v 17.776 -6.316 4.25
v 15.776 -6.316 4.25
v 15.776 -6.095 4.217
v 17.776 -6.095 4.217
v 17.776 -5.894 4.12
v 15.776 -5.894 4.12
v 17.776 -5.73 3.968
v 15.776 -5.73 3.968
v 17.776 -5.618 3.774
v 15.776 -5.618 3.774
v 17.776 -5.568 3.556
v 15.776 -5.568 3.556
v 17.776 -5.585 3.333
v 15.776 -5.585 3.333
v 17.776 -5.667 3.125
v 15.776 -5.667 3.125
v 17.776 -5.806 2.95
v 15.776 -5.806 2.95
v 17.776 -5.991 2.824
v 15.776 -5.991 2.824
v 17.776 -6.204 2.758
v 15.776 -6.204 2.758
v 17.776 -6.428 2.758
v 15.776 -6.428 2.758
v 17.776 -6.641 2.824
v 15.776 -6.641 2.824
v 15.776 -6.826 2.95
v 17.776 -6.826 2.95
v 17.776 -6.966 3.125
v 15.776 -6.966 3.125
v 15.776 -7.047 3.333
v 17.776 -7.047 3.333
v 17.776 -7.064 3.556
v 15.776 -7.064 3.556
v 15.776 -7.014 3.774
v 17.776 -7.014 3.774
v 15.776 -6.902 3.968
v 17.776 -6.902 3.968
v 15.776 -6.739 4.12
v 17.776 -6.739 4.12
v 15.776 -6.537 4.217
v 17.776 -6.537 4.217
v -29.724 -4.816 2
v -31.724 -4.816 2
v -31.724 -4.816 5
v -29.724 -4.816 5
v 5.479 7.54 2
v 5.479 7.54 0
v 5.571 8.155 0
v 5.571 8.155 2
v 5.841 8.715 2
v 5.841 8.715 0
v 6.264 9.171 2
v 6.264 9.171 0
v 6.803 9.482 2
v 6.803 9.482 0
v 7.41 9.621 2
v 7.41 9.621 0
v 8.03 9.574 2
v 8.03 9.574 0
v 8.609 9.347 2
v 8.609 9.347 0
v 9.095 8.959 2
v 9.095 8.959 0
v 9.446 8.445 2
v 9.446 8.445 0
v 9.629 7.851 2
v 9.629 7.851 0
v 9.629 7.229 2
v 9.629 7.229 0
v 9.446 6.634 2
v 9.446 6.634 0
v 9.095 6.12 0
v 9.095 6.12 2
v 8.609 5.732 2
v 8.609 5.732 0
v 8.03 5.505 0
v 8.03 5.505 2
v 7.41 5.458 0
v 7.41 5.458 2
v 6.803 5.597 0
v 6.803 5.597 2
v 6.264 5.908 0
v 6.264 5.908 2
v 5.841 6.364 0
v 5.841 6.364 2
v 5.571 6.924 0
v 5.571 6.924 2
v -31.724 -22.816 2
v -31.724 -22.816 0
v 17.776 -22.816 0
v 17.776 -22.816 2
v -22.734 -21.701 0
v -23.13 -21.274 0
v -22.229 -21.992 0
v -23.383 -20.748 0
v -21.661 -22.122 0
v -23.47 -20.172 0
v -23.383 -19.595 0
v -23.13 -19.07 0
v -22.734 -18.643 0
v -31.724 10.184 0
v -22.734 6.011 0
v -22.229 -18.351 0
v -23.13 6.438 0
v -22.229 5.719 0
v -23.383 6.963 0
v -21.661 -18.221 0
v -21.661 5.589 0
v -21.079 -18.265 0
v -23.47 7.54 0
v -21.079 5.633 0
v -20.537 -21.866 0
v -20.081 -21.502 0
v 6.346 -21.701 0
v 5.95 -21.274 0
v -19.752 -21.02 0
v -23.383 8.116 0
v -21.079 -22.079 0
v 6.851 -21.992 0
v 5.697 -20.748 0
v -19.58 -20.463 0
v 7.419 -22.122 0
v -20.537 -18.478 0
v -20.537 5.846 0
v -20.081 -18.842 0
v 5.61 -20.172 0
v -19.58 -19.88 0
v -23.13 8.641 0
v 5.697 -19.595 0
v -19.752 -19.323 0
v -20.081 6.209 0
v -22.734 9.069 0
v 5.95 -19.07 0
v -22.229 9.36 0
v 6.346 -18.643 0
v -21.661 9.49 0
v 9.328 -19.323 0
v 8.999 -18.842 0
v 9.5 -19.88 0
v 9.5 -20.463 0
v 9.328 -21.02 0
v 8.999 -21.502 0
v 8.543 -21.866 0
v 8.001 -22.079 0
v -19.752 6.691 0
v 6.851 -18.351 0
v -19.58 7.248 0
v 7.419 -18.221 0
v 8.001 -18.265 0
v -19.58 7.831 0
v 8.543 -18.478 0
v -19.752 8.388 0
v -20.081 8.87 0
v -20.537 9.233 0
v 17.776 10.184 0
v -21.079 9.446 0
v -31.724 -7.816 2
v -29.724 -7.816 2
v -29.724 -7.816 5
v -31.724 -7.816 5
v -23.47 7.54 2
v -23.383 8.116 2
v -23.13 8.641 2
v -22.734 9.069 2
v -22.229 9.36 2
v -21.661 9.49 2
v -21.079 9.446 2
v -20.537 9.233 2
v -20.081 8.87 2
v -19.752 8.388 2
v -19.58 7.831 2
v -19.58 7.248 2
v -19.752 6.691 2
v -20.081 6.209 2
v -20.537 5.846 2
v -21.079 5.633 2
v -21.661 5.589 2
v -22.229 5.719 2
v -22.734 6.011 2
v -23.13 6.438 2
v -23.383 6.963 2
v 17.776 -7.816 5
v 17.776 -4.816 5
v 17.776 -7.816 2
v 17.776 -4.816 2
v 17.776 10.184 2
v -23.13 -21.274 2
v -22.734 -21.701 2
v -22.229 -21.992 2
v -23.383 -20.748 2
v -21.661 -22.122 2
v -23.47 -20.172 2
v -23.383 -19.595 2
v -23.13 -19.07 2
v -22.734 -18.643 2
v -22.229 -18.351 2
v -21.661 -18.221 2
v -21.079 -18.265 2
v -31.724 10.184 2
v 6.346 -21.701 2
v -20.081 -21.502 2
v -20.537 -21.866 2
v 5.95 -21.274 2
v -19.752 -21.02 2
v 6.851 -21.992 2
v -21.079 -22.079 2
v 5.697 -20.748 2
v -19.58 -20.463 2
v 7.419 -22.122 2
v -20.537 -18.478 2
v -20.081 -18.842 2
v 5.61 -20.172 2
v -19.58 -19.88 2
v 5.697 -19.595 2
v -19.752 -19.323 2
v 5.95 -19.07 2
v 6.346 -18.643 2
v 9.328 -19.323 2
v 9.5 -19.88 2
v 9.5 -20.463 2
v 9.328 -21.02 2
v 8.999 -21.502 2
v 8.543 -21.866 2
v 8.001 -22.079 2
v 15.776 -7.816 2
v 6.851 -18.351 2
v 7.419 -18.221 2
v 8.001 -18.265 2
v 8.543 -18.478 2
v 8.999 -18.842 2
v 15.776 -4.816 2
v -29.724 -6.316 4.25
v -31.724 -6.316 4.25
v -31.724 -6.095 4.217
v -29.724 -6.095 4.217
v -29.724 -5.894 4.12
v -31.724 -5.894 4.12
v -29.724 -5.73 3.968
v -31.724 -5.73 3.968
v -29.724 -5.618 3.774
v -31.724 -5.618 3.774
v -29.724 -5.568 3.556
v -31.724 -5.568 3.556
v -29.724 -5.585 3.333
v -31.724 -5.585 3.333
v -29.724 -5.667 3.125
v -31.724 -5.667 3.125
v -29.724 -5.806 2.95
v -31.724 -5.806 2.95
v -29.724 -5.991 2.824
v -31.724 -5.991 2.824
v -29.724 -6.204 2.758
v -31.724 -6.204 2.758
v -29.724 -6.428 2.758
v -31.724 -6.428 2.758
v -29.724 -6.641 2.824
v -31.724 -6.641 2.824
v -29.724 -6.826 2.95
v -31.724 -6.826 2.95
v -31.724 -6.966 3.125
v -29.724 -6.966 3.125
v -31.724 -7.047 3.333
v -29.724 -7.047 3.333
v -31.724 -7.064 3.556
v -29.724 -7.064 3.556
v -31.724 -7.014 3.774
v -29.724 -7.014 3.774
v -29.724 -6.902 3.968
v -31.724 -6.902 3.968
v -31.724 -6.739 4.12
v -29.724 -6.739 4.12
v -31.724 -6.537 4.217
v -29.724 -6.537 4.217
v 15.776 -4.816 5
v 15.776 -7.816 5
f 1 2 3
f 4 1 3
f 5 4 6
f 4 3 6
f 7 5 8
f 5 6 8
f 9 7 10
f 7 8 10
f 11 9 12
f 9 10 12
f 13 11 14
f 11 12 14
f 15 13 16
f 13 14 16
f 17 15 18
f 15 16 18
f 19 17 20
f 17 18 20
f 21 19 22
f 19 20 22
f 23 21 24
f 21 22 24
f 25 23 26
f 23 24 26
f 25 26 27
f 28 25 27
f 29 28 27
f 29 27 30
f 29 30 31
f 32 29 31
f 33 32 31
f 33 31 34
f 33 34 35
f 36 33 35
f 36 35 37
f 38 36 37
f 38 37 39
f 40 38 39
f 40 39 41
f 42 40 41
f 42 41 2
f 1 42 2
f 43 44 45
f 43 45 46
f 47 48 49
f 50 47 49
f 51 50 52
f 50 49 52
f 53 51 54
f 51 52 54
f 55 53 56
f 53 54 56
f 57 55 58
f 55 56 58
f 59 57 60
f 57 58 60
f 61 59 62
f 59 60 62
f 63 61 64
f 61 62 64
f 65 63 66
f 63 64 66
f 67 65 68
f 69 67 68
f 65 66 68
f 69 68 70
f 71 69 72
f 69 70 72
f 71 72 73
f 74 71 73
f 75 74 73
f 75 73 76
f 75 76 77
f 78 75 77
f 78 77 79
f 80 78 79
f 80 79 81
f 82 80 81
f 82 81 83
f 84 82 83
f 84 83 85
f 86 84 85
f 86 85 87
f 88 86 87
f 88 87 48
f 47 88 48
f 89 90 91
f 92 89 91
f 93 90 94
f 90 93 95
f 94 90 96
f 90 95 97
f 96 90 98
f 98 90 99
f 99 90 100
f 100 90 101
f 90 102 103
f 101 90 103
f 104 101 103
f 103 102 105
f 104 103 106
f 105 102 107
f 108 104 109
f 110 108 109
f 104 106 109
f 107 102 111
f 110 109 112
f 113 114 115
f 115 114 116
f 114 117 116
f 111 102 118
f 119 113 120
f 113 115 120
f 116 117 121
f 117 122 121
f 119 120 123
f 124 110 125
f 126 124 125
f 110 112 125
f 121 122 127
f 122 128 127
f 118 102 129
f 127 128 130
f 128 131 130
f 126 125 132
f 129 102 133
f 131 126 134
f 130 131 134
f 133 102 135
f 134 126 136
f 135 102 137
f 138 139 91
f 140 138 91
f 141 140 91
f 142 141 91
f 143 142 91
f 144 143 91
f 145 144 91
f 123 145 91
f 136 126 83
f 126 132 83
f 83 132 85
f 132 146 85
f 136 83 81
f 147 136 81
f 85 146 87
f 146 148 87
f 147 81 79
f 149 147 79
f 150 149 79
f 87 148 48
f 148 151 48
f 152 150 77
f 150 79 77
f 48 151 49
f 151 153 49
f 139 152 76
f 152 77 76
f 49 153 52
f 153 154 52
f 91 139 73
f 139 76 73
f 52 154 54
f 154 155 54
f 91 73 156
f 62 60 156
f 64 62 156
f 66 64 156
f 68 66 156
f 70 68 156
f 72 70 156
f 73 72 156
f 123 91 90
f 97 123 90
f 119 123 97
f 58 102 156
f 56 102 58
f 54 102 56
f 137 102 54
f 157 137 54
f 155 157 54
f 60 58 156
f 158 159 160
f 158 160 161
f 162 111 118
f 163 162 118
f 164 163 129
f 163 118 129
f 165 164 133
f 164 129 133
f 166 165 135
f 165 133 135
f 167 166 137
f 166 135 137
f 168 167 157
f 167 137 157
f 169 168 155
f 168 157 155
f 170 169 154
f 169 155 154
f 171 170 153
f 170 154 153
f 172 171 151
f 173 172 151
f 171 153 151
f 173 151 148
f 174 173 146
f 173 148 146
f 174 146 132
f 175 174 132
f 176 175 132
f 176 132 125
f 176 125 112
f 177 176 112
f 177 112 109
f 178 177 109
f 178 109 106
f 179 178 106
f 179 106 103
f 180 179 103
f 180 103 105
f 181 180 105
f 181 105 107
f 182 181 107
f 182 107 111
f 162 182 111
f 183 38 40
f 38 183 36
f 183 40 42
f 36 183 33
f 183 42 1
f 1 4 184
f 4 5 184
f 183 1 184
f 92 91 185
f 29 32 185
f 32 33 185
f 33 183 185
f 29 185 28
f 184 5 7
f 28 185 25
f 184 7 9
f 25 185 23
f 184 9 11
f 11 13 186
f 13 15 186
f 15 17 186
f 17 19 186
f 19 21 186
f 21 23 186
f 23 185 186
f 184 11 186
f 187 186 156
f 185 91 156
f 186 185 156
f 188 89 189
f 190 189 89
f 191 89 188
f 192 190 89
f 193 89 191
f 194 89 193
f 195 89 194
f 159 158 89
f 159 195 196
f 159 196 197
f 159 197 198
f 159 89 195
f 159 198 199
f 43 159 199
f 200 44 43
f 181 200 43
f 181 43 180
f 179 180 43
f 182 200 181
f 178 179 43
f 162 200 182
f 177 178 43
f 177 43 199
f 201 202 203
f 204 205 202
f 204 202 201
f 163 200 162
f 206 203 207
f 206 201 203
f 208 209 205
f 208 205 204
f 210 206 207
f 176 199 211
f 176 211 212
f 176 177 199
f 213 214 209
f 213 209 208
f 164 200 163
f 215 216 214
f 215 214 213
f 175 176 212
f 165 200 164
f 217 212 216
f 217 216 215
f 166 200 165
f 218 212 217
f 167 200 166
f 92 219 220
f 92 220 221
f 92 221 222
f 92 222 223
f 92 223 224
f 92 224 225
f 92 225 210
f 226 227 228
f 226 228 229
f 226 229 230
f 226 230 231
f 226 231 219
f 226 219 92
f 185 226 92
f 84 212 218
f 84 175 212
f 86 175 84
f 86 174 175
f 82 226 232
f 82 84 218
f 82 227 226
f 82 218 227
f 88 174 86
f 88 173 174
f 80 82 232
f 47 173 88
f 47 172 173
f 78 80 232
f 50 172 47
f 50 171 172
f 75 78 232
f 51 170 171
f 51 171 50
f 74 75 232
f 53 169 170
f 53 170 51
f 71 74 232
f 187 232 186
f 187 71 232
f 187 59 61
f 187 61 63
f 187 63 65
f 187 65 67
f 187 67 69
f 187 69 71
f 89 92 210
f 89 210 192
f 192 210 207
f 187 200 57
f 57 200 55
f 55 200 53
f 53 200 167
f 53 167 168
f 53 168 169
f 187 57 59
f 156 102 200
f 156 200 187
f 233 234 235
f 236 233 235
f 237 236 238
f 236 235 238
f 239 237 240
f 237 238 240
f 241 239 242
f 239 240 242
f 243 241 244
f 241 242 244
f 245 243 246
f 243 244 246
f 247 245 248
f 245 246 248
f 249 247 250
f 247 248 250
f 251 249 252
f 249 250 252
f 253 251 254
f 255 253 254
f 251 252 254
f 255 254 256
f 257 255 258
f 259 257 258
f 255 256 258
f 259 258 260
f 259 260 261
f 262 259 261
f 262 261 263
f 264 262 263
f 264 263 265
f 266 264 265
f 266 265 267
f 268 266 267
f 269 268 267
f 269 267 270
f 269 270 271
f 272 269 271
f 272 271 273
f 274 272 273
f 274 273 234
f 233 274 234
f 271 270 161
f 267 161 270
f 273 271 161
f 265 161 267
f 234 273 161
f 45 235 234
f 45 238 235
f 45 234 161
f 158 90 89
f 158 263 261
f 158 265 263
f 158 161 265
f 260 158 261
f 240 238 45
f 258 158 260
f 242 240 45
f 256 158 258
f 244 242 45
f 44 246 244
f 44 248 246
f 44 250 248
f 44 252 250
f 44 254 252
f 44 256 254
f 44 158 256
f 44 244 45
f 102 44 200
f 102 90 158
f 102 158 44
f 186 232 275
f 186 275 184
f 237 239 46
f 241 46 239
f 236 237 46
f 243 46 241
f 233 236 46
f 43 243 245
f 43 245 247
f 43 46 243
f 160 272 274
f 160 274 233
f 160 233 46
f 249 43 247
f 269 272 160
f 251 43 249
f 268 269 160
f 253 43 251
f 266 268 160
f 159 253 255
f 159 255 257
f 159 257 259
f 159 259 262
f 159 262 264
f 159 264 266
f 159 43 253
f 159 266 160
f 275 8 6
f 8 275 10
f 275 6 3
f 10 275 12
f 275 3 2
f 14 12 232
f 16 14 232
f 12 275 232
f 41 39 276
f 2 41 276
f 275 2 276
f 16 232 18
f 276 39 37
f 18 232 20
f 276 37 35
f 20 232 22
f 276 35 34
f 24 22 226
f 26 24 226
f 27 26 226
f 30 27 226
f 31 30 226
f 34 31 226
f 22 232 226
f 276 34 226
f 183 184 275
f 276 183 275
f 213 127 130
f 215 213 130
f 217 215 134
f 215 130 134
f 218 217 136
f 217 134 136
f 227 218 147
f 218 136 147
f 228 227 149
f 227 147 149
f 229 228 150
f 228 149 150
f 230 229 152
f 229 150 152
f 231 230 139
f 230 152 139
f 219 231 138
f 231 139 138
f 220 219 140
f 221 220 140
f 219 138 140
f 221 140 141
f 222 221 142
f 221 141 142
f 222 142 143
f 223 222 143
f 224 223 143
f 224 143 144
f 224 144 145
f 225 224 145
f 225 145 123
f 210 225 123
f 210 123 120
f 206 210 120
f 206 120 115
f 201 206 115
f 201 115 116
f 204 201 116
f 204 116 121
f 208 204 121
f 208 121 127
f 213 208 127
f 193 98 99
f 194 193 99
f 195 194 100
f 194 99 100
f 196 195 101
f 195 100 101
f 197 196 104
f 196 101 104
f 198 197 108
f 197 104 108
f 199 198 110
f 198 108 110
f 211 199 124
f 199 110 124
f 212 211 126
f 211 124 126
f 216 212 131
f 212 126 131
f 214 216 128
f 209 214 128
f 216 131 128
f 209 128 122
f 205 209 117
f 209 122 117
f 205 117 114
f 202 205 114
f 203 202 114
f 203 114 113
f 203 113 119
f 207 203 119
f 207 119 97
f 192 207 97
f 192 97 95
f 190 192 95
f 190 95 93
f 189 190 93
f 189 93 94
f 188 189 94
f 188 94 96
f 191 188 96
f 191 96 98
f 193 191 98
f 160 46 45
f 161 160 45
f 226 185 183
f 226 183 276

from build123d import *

# Parameters (mm, degrees)
SKETCH1_W           = 49.5
SKETCH1_H           = 33
BOSS_EXTRUDE1_DEPTH = 2
BOSS_EXTRUDE4_DEPTH = 3
SKETCH9_R           = 0.75
CUT_EXTRUDE3_DEPTH  = 70
SKETCH10_R          = 2.087011894
SKETCH10_R_2        = 1.9558
CUT_EXTRUDE4_DEPTH  = 70


with BuildPart() as part:
    # Sketch1 → Boss-Extrude1 (new body)
    with BuildSketch(Plane.XY):
        with Locations((-6.974438903, -6.316084788)):
            Rectangle(SKETCH1_W, SKETCH1_H)
    extrude(amount=BOSS_EXTRUDE1_DEPTH)

    # Sketch8 → Boss-Extrude4 (add)
    with BuildSketch(Plane.XY.offset(2)):
        Polygon((-31.724438903, -6.316084788), (-31.724438903, -4.816084788), (-29.724438903, -4.816084788), (-29.724438903, -7.816084788), (-31.724438903, -7.816084788), align=None)
        Polygon((17.775561097, -4.816084788), (17.775561097, -7.816084788), (15.775561097, -7.816084788), (15.775561097, -6.316084788), (15.775561097, -4.816084788), align=None)
    extrude(amount=BOSS_EXTRUDE4_DEPTH)

    # Sketch9 → Cut-Extrude3 (cut)
    with BuildSketch(Plane.ZY.offset(31.724438903)):
        with Locations((3.5, -6.316084788)):
            Circle(SKETCH9_R)
    extrude(amount=-CUT_EXTRUDE3_DEPTH, mode=Mode.SUBTRACT)

    # Sketch10 → Cut-Extrude4 (cut)
    with BuildSketch(Plane(origin=(0, 0, 0), x_dir=(-1, 0, 0), z_dir=(0, 0, -1))):
        with Locations((-7.565561097, 7.539615212)):
            Circle(SKETCH10_R)
        with Locations((21.514438903, 7.539615212)):
            Circle(SKETCH10_R_2)
        with Locations((-7.565561097, -20.171784788)):
            Circle(SKETCH10_R_2)
        with Locations((21.514438903, -20.171784788)):
            Circle(SKETCH10_R_2)
    extrude(amount=-CUT_EXTRUDE4_DEPTH, mode=Mode.SUBTRACT)


solid = part.part
